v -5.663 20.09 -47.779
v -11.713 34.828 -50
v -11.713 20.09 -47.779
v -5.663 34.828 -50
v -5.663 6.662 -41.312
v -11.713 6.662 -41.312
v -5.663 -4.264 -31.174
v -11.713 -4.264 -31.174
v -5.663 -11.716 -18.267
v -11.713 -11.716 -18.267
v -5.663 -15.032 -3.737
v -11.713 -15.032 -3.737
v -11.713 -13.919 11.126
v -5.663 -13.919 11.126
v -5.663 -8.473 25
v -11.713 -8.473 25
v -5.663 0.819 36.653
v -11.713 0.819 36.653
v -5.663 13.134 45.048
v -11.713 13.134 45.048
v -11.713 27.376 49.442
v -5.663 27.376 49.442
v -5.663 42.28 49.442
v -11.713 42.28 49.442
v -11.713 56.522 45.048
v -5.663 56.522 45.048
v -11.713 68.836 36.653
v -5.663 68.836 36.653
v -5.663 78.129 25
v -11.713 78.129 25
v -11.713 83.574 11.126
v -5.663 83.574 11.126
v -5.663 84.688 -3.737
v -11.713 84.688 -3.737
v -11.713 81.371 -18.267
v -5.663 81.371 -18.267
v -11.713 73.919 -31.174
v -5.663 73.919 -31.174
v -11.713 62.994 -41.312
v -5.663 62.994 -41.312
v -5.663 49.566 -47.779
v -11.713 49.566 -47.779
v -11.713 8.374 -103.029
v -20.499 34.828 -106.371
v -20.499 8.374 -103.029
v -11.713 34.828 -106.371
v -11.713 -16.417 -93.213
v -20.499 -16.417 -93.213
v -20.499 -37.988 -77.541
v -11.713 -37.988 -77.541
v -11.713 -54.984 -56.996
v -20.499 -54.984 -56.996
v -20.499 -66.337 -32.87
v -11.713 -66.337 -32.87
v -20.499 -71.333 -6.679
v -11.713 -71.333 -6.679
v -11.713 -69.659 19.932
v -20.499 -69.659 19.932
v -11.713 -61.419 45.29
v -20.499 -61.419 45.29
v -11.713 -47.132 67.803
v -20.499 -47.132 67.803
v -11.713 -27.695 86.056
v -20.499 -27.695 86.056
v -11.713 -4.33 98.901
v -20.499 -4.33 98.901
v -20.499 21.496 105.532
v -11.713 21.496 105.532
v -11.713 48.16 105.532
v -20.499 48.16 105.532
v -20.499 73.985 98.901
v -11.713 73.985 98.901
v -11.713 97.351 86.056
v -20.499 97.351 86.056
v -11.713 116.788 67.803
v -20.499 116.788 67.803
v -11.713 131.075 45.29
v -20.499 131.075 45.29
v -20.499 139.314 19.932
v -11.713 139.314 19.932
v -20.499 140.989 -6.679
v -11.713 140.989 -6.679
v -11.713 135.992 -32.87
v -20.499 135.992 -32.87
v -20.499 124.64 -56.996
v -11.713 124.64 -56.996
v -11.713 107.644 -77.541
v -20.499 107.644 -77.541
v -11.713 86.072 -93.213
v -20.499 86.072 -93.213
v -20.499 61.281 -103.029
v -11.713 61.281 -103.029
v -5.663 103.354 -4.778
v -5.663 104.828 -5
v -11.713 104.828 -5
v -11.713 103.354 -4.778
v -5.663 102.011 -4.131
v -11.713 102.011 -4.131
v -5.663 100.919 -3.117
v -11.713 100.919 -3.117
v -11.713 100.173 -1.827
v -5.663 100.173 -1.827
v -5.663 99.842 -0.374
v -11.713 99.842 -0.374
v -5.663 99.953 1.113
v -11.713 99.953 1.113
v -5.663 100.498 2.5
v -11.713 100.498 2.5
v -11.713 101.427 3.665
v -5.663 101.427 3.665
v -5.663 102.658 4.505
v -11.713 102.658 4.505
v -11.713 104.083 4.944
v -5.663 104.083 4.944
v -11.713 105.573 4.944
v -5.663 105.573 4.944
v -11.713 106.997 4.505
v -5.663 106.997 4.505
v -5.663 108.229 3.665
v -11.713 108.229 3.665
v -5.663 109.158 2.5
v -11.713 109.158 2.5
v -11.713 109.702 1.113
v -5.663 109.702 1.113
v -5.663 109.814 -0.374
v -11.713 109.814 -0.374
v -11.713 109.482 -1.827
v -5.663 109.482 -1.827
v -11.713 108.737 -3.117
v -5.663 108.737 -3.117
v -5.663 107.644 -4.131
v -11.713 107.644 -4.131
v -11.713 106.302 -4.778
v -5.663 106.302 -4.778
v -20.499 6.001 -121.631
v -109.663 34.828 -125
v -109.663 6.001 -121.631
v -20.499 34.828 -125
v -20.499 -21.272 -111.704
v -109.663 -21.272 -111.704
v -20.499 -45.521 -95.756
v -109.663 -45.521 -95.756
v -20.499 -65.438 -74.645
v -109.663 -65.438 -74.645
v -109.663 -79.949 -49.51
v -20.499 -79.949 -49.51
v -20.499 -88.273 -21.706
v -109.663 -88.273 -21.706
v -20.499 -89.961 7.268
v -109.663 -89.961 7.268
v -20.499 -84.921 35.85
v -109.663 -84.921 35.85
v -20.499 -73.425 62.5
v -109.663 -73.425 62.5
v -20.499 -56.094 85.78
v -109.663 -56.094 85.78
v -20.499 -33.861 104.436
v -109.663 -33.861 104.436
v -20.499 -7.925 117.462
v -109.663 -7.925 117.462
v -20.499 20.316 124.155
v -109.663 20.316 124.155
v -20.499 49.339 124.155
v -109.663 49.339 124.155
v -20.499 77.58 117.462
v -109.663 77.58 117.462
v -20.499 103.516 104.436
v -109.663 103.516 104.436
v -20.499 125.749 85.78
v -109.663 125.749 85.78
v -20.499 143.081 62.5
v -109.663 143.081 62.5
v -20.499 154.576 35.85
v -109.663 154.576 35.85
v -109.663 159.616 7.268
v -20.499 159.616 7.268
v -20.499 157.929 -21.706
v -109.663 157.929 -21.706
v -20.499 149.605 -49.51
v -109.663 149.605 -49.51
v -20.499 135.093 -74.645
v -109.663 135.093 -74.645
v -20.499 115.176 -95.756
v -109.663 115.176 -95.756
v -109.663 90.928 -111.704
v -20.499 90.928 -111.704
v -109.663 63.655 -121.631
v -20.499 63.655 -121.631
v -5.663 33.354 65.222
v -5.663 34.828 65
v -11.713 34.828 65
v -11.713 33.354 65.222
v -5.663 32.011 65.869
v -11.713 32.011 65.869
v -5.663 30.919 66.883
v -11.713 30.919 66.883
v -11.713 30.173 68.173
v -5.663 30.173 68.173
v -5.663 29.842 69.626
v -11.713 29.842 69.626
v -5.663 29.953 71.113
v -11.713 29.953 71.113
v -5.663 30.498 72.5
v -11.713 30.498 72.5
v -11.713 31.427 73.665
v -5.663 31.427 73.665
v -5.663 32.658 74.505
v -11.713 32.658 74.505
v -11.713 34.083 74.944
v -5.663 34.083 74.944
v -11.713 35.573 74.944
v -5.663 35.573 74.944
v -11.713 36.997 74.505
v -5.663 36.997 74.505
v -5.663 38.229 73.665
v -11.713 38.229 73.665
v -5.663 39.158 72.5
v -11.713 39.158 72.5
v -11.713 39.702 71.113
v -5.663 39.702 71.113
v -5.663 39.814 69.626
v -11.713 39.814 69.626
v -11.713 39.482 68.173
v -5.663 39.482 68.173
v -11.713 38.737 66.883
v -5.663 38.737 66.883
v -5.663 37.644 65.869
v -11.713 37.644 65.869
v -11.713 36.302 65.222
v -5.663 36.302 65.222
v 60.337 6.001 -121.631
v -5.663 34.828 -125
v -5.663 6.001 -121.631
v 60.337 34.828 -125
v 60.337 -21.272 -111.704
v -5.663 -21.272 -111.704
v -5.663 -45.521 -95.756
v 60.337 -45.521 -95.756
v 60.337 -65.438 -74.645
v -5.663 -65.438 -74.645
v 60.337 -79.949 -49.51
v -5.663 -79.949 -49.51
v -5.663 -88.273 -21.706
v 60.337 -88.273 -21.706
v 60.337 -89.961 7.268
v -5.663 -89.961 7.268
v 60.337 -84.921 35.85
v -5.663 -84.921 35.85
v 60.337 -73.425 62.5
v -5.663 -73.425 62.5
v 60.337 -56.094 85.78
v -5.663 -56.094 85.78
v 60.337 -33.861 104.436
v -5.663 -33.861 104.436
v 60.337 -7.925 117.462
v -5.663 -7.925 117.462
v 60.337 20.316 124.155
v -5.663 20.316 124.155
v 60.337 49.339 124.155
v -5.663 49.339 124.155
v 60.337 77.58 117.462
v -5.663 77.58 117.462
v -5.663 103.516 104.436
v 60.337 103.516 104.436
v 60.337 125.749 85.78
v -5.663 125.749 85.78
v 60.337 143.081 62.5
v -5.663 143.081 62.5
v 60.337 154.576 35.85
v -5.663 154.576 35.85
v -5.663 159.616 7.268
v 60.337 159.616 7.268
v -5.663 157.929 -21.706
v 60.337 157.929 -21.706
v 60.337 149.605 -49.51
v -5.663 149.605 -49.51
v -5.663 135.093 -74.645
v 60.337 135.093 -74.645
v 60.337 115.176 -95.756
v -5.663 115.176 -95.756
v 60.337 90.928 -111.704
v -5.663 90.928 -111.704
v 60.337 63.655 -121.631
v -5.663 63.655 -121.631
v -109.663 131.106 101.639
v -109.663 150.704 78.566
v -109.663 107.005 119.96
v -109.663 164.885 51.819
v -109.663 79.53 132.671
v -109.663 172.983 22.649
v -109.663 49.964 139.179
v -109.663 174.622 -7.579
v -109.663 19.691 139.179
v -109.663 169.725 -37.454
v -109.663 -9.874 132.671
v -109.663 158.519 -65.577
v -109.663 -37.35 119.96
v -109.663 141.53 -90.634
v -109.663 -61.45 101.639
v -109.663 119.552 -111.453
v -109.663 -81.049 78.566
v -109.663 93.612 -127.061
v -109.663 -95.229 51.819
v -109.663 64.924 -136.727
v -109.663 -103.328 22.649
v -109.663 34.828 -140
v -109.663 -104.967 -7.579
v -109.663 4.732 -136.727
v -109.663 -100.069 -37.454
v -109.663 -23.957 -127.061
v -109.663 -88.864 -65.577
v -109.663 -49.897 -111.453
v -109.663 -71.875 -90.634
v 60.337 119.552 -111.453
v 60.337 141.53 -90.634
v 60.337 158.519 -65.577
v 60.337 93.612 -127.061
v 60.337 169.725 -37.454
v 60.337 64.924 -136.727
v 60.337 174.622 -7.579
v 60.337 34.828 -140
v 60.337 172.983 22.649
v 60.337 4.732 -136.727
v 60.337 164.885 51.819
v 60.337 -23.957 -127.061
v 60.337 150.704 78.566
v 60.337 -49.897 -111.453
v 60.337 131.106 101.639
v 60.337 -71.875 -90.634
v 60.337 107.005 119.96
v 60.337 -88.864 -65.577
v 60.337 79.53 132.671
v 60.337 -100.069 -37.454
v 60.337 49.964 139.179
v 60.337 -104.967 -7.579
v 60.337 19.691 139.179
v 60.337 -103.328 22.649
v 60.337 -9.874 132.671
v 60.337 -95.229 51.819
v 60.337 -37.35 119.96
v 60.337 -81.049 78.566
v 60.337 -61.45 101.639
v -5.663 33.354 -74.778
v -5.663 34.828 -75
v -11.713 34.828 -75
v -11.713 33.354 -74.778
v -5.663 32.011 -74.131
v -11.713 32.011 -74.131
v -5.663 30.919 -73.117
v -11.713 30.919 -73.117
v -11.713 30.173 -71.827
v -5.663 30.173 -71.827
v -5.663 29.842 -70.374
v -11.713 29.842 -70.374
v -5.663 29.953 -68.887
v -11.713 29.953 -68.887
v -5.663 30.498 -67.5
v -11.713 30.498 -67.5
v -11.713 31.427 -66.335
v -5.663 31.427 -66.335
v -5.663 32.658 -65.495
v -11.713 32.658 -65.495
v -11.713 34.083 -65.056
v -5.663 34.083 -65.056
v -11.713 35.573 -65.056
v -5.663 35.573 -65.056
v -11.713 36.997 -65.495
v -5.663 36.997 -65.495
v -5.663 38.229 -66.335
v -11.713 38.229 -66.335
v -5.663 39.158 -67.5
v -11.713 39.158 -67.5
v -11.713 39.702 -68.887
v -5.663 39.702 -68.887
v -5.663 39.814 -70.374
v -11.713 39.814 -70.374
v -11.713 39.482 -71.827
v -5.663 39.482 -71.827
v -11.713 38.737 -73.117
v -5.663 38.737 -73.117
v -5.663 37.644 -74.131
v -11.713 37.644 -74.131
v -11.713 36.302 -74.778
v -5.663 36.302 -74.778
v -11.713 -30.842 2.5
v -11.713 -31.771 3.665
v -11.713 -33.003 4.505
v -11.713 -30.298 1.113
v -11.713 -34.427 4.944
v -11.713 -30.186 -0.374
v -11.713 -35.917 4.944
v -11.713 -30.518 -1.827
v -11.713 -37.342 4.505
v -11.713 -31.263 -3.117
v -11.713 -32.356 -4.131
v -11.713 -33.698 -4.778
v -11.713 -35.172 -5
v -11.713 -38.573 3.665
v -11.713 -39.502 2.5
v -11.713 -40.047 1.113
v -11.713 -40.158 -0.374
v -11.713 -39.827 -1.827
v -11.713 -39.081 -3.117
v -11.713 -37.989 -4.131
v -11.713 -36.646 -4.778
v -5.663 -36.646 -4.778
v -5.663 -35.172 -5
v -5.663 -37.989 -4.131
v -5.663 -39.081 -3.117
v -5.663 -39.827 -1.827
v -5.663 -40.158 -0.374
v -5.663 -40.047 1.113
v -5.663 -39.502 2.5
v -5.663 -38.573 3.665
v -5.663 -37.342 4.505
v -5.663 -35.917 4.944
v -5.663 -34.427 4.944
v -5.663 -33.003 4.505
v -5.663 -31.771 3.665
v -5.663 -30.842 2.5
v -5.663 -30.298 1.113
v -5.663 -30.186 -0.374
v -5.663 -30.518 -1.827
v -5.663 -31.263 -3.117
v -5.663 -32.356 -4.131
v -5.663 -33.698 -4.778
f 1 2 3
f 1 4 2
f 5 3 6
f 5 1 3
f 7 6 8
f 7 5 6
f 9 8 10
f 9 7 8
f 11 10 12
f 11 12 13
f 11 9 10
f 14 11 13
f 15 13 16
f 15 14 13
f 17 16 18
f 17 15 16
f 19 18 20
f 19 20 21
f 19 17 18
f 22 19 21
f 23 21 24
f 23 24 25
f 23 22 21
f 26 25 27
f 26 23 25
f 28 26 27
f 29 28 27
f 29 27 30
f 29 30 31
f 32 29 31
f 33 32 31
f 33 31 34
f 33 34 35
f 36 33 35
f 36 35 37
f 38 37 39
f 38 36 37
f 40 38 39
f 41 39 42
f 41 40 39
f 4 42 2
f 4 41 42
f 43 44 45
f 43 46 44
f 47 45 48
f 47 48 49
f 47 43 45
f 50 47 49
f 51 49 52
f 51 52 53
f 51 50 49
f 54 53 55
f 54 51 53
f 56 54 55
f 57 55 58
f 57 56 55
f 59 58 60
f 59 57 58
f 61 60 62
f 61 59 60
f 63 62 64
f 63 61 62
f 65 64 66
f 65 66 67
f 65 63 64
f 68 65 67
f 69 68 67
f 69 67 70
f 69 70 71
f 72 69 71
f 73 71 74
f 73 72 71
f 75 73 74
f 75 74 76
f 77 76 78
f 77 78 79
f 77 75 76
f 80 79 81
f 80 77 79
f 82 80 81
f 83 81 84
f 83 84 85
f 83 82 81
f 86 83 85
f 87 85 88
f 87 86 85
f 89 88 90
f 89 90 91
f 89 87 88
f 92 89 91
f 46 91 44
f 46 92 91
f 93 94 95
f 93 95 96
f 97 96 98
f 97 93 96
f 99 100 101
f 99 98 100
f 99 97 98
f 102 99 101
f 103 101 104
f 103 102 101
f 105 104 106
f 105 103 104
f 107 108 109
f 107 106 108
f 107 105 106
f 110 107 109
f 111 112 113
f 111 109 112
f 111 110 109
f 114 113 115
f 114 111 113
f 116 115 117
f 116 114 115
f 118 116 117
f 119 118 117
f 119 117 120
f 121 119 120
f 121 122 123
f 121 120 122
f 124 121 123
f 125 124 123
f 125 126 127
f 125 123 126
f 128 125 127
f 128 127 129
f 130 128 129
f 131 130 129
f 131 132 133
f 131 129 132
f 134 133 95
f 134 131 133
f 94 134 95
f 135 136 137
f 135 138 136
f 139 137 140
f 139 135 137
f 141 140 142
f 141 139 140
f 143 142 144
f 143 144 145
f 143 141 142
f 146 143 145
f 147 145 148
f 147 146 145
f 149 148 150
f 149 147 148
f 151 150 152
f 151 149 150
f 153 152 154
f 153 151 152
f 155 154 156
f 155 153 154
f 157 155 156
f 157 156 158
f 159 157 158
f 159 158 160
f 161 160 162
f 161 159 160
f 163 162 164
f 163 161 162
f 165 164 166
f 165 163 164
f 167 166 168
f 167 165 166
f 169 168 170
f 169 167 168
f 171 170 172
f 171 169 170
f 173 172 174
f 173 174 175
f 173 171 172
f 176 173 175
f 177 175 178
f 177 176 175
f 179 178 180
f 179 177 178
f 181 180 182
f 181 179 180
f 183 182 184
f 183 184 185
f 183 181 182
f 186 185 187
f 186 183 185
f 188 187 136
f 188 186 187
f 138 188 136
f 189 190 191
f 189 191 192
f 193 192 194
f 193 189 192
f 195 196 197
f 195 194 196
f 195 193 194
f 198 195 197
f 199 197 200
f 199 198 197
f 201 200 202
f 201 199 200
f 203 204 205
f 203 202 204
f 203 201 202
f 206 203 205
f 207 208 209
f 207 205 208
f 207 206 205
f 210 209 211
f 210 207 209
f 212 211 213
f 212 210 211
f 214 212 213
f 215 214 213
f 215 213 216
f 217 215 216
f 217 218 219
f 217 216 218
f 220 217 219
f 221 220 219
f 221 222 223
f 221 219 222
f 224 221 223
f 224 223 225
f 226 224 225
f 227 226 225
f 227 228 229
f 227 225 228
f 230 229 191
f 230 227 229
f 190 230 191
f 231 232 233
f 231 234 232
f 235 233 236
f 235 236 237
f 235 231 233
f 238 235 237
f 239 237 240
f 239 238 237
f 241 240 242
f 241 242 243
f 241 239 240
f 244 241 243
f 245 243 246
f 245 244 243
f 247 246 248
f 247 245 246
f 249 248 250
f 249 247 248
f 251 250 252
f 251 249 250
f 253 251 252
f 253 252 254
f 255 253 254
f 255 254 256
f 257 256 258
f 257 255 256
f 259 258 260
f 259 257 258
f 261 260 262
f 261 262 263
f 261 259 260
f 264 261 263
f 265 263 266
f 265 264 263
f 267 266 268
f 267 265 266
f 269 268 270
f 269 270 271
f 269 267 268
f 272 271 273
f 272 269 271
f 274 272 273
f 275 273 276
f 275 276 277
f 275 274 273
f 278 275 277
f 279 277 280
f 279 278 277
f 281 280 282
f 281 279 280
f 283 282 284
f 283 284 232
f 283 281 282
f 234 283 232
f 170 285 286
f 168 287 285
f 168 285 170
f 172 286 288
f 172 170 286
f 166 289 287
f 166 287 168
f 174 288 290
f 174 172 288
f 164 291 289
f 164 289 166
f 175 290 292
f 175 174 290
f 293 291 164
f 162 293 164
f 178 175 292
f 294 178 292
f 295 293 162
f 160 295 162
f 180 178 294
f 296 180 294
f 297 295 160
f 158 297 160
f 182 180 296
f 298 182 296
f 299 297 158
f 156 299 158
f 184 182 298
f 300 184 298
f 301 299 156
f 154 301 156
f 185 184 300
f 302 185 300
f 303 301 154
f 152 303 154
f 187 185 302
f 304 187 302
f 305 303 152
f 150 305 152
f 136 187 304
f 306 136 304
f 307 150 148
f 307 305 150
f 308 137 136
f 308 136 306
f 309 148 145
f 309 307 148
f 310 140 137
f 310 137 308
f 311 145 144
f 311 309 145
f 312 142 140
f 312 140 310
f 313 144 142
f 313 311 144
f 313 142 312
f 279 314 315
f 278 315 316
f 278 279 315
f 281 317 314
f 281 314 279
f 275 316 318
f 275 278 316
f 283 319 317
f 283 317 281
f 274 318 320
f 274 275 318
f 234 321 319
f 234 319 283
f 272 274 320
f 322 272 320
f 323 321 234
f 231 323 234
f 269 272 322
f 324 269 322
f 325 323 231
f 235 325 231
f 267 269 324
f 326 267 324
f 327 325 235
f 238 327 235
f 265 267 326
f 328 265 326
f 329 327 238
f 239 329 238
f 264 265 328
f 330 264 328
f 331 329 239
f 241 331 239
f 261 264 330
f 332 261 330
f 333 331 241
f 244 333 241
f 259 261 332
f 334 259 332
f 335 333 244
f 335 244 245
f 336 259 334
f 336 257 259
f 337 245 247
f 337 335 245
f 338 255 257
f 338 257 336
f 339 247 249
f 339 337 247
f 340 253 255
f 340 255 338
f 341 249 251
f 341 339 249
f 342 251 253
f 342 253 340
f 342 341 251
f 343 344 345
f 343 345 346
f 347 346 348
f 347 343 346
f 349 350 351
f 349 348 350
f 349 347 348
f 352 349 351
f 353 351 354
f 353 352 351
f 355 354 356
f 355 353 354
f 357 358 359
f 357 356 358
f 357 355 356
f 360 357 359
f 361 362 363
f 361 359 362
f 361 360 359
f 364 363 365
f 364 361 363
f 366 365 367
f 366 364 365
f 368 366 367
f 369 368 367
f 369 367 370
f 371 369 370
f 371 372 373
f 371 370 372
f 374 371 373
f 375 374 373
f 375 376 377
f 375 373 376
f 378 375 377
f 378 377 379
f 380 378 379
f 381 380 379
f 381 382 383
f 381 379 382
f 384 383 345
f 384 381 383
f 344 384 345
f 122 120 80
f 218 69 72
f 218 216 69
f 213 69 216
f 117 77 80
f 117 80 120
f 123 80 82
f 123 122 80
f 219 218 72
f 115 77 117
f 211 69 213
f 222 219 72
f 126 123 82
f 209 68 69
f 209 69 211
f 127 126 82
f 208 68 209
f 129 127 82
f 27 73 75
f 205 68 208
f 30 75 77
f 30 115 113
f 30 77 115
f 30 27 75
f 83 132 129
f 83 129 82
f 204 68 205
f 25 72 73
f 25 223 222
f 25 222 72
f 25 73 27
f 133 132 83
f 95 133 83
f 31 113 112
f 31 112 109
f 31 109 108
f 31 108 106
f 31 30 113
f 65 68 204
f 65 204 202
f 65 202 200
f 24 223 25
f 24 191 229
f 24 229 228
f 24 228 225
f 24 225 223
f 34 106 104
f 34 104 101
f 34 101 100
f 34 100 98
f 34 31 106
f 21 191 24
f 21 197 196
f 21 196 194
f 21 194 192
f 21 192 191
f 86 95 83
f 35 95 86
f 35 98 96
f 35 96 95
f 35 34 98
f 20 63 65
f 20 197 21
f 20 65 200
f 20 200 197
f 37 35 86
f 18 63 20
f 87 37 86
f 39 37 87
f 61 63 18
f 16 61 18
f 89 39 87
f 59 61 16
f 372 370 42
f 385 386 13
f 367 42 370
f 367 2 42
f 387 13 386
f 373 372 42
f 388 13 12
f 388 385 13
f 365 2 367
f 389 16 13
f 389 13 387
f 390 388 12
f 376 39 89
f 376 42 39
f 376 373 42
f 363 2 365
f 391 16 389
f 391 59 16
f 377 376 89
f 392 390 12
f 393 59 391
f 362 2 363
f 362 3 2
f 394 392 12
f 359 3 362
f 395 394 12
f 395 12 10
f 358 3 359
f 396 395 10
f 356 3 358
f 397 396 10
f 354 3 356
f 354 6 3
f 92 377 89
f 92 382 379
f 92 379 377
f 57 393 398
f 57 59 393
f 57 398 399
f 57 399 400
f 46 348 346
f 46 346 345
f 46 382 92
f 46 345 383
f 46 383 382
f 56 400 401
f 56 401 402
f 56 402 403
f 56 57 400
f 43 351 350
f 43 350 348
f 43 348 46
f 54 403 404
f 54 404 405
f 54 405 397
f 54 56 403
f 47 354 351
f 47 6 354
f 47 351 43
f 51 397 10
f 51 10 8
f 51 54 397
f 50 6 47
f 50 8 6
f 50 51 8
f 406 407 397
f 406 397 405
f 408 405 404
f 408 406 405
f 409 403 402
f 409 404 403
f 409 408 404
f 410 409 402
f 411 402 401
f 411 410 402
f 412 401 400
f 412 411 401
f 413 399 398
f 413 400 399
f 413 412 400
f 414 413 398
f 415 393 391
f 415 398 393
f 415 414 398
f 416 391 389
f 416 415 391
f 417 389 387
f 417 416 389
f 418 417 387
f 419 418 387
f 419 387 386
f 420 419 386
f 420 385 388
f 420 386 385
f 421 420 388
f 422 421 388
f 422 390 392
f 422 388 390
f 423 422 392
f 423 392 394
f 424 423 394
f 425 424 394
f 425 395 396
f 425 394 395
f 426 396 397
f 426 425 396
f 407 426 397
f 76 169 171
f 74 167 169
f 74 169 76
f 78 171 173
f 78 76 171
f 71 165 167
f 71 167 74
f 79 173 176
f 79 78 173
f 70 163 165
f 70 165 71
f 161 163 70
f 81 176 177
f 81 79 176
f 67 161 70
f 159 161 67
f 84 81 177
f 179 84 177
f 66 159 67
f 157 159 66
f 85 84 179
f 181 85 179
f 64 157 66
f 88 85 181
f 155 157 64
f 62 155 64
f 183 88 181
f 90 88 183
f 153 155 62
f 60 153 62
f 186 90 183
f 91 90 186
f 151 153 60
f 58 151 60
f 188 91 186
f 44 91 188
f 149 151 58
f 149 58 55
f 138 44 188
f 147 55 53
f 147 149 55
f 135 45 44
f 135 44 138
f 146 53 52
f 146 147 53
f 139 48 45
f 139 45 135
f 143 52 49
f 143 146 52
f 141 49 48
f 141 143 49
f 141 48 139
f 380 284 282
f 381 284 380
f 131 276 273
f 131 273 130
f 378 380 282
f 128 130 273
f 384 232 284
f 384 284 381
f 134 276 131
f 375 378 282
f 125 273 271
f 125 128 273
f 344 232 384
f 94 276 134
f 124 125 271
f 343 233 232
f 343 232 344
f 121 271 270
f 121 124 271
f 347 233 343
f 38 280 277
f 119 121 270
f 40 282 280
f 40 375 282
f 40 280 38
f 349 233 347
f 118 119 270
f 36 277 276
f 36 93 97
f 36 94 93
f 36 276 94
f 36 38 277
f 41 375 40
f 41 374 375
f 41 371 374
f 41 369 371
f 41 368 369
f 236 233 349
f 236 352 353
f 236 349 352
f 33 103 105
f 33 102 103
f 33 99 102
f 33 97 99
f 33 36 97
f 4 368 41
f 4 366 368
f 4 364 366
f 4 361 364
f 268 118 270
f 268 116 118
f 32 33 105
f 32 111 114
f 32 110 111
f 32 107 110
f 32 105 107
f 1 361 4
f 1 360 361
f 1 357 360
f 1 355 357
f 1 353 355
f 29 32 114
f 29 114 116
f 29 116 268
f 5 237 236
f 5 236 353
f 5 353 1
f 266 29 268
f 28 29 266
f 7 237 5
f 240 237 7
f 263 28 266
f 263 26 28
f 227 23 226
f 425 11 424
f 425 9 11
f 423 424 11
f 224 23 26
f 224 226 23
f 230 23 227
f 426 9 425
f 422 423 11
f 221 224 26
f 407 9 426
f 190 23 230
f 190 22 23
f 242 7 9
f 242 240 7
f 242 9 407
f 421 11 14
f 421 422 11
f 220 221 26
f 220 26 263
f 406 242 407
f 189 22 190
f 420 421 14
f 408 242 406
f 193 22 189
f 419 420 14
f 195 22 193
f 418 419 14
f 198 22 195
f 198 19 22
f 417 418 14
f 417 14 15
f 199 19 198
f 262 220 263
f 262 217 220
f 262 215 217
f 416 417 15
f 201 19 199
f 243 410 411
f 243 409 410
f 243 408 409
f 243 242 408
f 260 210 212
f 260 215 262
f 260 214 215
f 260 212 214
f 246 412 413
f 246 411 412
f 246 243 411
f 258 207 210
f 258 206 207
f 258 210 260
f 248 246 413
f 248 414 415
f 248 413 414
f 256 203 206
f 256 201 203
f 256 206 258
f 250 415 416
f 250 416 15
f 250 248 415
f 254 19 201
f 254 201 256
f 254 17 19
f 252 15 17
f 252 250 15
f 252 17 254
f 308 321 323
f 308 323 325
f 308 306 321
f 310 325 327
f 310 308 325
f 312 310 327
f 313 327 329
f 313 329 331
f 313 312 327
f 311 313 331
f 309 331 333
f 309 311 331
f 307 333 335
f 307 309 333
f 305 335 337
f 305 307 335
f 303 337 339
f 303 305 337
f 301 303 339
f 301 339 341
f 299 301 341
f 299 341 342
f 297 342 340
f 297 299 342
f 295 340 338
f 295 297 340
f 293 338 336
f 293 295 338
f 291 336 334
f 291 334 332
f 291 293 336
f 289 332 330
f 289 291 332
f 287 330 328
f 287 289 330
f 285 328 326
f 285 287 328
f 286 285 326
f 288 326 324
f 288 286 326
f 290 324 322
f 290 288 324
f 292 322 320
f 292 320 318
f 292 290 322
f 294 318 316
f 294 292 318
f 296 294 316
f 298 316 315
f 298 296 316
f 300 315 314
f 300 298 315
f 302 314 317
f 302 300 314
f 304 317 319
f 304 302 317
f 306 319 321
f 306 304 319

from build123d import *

# Parameters (mm, degrees)
SCALE1_SCALE            = 10
CUT_EXTRUDE1_DEPTH      = 10
CUT_EXTRUDE1_DEPTH_BACK = 10
SKETCH4_R               = 5


with BuildPart() as part:
    # Sketch1 → Revolve1 (revolve)
    with BuildSketch(Plane.XY, mode=Mode.PRIVATE) as revolve1_sk:
        Polygon((-22.439160201, 47.327777778), (-22.439160201, 45.464860395), (-21.56053595, 45.464860395), (-21.56053595, 39.827777778), (-20.955555556, 39.827777778), (-20.955555556, 47.327777778), (-14.355555556, 47.327777778), (-14.355555556, 48.827777778), (-31.355555556, 48.827777778), (-31.355555556, 47.327777778), align=None)
    revolve(revolve1_sk.sketch.rotate(Axis((-14.355555556, 34.827777778, 0), (-1, 0, 0)), 90), axis=Axis((-14.355555556, 34.827777778, 0), (-1, 0, 0)))


with BuildPart() as part_1:
    # Scale1: scaled about (-22.654736369, 34.827777778, 0)
    add(part.part.scale(SCALE1_SCALE).moved(Location((203.892627321, -313.450000002, 0))))

    # Sketch4 → Cut-Extrude1 (cut, two sides: drawn at the far end of the back side and taken through both)
    with BuildSketch(Plane.ZY.offset(11.712732179).offset(-CUT_EXTRUDE1_DEPTH_BACK)):
        with Locations(Location((-70, 34.827777778, 0), (0, 0, 180))):
            Circle(SKETCH4_R)
        with Locations(Location((0, 104.827777778, 0), (0, 0, 180))):
            Circle(SKETCH4_R)
        with Locations(Location((70, 34.827777778, 0), (0, 0, 180))):
            Circle(SKETCH4_R)
        with Locations(Location((0, -35.172222222, 0), (0, 0, 180))):
            Circle(SKETCH4_R)
    extrude(amount=CUT_EXTRUDE1_DEPTH + CUT_EXTRUDE1_DEPTH_BACK, mode=Mode.SUBTRACT)


solid = part_1.part
